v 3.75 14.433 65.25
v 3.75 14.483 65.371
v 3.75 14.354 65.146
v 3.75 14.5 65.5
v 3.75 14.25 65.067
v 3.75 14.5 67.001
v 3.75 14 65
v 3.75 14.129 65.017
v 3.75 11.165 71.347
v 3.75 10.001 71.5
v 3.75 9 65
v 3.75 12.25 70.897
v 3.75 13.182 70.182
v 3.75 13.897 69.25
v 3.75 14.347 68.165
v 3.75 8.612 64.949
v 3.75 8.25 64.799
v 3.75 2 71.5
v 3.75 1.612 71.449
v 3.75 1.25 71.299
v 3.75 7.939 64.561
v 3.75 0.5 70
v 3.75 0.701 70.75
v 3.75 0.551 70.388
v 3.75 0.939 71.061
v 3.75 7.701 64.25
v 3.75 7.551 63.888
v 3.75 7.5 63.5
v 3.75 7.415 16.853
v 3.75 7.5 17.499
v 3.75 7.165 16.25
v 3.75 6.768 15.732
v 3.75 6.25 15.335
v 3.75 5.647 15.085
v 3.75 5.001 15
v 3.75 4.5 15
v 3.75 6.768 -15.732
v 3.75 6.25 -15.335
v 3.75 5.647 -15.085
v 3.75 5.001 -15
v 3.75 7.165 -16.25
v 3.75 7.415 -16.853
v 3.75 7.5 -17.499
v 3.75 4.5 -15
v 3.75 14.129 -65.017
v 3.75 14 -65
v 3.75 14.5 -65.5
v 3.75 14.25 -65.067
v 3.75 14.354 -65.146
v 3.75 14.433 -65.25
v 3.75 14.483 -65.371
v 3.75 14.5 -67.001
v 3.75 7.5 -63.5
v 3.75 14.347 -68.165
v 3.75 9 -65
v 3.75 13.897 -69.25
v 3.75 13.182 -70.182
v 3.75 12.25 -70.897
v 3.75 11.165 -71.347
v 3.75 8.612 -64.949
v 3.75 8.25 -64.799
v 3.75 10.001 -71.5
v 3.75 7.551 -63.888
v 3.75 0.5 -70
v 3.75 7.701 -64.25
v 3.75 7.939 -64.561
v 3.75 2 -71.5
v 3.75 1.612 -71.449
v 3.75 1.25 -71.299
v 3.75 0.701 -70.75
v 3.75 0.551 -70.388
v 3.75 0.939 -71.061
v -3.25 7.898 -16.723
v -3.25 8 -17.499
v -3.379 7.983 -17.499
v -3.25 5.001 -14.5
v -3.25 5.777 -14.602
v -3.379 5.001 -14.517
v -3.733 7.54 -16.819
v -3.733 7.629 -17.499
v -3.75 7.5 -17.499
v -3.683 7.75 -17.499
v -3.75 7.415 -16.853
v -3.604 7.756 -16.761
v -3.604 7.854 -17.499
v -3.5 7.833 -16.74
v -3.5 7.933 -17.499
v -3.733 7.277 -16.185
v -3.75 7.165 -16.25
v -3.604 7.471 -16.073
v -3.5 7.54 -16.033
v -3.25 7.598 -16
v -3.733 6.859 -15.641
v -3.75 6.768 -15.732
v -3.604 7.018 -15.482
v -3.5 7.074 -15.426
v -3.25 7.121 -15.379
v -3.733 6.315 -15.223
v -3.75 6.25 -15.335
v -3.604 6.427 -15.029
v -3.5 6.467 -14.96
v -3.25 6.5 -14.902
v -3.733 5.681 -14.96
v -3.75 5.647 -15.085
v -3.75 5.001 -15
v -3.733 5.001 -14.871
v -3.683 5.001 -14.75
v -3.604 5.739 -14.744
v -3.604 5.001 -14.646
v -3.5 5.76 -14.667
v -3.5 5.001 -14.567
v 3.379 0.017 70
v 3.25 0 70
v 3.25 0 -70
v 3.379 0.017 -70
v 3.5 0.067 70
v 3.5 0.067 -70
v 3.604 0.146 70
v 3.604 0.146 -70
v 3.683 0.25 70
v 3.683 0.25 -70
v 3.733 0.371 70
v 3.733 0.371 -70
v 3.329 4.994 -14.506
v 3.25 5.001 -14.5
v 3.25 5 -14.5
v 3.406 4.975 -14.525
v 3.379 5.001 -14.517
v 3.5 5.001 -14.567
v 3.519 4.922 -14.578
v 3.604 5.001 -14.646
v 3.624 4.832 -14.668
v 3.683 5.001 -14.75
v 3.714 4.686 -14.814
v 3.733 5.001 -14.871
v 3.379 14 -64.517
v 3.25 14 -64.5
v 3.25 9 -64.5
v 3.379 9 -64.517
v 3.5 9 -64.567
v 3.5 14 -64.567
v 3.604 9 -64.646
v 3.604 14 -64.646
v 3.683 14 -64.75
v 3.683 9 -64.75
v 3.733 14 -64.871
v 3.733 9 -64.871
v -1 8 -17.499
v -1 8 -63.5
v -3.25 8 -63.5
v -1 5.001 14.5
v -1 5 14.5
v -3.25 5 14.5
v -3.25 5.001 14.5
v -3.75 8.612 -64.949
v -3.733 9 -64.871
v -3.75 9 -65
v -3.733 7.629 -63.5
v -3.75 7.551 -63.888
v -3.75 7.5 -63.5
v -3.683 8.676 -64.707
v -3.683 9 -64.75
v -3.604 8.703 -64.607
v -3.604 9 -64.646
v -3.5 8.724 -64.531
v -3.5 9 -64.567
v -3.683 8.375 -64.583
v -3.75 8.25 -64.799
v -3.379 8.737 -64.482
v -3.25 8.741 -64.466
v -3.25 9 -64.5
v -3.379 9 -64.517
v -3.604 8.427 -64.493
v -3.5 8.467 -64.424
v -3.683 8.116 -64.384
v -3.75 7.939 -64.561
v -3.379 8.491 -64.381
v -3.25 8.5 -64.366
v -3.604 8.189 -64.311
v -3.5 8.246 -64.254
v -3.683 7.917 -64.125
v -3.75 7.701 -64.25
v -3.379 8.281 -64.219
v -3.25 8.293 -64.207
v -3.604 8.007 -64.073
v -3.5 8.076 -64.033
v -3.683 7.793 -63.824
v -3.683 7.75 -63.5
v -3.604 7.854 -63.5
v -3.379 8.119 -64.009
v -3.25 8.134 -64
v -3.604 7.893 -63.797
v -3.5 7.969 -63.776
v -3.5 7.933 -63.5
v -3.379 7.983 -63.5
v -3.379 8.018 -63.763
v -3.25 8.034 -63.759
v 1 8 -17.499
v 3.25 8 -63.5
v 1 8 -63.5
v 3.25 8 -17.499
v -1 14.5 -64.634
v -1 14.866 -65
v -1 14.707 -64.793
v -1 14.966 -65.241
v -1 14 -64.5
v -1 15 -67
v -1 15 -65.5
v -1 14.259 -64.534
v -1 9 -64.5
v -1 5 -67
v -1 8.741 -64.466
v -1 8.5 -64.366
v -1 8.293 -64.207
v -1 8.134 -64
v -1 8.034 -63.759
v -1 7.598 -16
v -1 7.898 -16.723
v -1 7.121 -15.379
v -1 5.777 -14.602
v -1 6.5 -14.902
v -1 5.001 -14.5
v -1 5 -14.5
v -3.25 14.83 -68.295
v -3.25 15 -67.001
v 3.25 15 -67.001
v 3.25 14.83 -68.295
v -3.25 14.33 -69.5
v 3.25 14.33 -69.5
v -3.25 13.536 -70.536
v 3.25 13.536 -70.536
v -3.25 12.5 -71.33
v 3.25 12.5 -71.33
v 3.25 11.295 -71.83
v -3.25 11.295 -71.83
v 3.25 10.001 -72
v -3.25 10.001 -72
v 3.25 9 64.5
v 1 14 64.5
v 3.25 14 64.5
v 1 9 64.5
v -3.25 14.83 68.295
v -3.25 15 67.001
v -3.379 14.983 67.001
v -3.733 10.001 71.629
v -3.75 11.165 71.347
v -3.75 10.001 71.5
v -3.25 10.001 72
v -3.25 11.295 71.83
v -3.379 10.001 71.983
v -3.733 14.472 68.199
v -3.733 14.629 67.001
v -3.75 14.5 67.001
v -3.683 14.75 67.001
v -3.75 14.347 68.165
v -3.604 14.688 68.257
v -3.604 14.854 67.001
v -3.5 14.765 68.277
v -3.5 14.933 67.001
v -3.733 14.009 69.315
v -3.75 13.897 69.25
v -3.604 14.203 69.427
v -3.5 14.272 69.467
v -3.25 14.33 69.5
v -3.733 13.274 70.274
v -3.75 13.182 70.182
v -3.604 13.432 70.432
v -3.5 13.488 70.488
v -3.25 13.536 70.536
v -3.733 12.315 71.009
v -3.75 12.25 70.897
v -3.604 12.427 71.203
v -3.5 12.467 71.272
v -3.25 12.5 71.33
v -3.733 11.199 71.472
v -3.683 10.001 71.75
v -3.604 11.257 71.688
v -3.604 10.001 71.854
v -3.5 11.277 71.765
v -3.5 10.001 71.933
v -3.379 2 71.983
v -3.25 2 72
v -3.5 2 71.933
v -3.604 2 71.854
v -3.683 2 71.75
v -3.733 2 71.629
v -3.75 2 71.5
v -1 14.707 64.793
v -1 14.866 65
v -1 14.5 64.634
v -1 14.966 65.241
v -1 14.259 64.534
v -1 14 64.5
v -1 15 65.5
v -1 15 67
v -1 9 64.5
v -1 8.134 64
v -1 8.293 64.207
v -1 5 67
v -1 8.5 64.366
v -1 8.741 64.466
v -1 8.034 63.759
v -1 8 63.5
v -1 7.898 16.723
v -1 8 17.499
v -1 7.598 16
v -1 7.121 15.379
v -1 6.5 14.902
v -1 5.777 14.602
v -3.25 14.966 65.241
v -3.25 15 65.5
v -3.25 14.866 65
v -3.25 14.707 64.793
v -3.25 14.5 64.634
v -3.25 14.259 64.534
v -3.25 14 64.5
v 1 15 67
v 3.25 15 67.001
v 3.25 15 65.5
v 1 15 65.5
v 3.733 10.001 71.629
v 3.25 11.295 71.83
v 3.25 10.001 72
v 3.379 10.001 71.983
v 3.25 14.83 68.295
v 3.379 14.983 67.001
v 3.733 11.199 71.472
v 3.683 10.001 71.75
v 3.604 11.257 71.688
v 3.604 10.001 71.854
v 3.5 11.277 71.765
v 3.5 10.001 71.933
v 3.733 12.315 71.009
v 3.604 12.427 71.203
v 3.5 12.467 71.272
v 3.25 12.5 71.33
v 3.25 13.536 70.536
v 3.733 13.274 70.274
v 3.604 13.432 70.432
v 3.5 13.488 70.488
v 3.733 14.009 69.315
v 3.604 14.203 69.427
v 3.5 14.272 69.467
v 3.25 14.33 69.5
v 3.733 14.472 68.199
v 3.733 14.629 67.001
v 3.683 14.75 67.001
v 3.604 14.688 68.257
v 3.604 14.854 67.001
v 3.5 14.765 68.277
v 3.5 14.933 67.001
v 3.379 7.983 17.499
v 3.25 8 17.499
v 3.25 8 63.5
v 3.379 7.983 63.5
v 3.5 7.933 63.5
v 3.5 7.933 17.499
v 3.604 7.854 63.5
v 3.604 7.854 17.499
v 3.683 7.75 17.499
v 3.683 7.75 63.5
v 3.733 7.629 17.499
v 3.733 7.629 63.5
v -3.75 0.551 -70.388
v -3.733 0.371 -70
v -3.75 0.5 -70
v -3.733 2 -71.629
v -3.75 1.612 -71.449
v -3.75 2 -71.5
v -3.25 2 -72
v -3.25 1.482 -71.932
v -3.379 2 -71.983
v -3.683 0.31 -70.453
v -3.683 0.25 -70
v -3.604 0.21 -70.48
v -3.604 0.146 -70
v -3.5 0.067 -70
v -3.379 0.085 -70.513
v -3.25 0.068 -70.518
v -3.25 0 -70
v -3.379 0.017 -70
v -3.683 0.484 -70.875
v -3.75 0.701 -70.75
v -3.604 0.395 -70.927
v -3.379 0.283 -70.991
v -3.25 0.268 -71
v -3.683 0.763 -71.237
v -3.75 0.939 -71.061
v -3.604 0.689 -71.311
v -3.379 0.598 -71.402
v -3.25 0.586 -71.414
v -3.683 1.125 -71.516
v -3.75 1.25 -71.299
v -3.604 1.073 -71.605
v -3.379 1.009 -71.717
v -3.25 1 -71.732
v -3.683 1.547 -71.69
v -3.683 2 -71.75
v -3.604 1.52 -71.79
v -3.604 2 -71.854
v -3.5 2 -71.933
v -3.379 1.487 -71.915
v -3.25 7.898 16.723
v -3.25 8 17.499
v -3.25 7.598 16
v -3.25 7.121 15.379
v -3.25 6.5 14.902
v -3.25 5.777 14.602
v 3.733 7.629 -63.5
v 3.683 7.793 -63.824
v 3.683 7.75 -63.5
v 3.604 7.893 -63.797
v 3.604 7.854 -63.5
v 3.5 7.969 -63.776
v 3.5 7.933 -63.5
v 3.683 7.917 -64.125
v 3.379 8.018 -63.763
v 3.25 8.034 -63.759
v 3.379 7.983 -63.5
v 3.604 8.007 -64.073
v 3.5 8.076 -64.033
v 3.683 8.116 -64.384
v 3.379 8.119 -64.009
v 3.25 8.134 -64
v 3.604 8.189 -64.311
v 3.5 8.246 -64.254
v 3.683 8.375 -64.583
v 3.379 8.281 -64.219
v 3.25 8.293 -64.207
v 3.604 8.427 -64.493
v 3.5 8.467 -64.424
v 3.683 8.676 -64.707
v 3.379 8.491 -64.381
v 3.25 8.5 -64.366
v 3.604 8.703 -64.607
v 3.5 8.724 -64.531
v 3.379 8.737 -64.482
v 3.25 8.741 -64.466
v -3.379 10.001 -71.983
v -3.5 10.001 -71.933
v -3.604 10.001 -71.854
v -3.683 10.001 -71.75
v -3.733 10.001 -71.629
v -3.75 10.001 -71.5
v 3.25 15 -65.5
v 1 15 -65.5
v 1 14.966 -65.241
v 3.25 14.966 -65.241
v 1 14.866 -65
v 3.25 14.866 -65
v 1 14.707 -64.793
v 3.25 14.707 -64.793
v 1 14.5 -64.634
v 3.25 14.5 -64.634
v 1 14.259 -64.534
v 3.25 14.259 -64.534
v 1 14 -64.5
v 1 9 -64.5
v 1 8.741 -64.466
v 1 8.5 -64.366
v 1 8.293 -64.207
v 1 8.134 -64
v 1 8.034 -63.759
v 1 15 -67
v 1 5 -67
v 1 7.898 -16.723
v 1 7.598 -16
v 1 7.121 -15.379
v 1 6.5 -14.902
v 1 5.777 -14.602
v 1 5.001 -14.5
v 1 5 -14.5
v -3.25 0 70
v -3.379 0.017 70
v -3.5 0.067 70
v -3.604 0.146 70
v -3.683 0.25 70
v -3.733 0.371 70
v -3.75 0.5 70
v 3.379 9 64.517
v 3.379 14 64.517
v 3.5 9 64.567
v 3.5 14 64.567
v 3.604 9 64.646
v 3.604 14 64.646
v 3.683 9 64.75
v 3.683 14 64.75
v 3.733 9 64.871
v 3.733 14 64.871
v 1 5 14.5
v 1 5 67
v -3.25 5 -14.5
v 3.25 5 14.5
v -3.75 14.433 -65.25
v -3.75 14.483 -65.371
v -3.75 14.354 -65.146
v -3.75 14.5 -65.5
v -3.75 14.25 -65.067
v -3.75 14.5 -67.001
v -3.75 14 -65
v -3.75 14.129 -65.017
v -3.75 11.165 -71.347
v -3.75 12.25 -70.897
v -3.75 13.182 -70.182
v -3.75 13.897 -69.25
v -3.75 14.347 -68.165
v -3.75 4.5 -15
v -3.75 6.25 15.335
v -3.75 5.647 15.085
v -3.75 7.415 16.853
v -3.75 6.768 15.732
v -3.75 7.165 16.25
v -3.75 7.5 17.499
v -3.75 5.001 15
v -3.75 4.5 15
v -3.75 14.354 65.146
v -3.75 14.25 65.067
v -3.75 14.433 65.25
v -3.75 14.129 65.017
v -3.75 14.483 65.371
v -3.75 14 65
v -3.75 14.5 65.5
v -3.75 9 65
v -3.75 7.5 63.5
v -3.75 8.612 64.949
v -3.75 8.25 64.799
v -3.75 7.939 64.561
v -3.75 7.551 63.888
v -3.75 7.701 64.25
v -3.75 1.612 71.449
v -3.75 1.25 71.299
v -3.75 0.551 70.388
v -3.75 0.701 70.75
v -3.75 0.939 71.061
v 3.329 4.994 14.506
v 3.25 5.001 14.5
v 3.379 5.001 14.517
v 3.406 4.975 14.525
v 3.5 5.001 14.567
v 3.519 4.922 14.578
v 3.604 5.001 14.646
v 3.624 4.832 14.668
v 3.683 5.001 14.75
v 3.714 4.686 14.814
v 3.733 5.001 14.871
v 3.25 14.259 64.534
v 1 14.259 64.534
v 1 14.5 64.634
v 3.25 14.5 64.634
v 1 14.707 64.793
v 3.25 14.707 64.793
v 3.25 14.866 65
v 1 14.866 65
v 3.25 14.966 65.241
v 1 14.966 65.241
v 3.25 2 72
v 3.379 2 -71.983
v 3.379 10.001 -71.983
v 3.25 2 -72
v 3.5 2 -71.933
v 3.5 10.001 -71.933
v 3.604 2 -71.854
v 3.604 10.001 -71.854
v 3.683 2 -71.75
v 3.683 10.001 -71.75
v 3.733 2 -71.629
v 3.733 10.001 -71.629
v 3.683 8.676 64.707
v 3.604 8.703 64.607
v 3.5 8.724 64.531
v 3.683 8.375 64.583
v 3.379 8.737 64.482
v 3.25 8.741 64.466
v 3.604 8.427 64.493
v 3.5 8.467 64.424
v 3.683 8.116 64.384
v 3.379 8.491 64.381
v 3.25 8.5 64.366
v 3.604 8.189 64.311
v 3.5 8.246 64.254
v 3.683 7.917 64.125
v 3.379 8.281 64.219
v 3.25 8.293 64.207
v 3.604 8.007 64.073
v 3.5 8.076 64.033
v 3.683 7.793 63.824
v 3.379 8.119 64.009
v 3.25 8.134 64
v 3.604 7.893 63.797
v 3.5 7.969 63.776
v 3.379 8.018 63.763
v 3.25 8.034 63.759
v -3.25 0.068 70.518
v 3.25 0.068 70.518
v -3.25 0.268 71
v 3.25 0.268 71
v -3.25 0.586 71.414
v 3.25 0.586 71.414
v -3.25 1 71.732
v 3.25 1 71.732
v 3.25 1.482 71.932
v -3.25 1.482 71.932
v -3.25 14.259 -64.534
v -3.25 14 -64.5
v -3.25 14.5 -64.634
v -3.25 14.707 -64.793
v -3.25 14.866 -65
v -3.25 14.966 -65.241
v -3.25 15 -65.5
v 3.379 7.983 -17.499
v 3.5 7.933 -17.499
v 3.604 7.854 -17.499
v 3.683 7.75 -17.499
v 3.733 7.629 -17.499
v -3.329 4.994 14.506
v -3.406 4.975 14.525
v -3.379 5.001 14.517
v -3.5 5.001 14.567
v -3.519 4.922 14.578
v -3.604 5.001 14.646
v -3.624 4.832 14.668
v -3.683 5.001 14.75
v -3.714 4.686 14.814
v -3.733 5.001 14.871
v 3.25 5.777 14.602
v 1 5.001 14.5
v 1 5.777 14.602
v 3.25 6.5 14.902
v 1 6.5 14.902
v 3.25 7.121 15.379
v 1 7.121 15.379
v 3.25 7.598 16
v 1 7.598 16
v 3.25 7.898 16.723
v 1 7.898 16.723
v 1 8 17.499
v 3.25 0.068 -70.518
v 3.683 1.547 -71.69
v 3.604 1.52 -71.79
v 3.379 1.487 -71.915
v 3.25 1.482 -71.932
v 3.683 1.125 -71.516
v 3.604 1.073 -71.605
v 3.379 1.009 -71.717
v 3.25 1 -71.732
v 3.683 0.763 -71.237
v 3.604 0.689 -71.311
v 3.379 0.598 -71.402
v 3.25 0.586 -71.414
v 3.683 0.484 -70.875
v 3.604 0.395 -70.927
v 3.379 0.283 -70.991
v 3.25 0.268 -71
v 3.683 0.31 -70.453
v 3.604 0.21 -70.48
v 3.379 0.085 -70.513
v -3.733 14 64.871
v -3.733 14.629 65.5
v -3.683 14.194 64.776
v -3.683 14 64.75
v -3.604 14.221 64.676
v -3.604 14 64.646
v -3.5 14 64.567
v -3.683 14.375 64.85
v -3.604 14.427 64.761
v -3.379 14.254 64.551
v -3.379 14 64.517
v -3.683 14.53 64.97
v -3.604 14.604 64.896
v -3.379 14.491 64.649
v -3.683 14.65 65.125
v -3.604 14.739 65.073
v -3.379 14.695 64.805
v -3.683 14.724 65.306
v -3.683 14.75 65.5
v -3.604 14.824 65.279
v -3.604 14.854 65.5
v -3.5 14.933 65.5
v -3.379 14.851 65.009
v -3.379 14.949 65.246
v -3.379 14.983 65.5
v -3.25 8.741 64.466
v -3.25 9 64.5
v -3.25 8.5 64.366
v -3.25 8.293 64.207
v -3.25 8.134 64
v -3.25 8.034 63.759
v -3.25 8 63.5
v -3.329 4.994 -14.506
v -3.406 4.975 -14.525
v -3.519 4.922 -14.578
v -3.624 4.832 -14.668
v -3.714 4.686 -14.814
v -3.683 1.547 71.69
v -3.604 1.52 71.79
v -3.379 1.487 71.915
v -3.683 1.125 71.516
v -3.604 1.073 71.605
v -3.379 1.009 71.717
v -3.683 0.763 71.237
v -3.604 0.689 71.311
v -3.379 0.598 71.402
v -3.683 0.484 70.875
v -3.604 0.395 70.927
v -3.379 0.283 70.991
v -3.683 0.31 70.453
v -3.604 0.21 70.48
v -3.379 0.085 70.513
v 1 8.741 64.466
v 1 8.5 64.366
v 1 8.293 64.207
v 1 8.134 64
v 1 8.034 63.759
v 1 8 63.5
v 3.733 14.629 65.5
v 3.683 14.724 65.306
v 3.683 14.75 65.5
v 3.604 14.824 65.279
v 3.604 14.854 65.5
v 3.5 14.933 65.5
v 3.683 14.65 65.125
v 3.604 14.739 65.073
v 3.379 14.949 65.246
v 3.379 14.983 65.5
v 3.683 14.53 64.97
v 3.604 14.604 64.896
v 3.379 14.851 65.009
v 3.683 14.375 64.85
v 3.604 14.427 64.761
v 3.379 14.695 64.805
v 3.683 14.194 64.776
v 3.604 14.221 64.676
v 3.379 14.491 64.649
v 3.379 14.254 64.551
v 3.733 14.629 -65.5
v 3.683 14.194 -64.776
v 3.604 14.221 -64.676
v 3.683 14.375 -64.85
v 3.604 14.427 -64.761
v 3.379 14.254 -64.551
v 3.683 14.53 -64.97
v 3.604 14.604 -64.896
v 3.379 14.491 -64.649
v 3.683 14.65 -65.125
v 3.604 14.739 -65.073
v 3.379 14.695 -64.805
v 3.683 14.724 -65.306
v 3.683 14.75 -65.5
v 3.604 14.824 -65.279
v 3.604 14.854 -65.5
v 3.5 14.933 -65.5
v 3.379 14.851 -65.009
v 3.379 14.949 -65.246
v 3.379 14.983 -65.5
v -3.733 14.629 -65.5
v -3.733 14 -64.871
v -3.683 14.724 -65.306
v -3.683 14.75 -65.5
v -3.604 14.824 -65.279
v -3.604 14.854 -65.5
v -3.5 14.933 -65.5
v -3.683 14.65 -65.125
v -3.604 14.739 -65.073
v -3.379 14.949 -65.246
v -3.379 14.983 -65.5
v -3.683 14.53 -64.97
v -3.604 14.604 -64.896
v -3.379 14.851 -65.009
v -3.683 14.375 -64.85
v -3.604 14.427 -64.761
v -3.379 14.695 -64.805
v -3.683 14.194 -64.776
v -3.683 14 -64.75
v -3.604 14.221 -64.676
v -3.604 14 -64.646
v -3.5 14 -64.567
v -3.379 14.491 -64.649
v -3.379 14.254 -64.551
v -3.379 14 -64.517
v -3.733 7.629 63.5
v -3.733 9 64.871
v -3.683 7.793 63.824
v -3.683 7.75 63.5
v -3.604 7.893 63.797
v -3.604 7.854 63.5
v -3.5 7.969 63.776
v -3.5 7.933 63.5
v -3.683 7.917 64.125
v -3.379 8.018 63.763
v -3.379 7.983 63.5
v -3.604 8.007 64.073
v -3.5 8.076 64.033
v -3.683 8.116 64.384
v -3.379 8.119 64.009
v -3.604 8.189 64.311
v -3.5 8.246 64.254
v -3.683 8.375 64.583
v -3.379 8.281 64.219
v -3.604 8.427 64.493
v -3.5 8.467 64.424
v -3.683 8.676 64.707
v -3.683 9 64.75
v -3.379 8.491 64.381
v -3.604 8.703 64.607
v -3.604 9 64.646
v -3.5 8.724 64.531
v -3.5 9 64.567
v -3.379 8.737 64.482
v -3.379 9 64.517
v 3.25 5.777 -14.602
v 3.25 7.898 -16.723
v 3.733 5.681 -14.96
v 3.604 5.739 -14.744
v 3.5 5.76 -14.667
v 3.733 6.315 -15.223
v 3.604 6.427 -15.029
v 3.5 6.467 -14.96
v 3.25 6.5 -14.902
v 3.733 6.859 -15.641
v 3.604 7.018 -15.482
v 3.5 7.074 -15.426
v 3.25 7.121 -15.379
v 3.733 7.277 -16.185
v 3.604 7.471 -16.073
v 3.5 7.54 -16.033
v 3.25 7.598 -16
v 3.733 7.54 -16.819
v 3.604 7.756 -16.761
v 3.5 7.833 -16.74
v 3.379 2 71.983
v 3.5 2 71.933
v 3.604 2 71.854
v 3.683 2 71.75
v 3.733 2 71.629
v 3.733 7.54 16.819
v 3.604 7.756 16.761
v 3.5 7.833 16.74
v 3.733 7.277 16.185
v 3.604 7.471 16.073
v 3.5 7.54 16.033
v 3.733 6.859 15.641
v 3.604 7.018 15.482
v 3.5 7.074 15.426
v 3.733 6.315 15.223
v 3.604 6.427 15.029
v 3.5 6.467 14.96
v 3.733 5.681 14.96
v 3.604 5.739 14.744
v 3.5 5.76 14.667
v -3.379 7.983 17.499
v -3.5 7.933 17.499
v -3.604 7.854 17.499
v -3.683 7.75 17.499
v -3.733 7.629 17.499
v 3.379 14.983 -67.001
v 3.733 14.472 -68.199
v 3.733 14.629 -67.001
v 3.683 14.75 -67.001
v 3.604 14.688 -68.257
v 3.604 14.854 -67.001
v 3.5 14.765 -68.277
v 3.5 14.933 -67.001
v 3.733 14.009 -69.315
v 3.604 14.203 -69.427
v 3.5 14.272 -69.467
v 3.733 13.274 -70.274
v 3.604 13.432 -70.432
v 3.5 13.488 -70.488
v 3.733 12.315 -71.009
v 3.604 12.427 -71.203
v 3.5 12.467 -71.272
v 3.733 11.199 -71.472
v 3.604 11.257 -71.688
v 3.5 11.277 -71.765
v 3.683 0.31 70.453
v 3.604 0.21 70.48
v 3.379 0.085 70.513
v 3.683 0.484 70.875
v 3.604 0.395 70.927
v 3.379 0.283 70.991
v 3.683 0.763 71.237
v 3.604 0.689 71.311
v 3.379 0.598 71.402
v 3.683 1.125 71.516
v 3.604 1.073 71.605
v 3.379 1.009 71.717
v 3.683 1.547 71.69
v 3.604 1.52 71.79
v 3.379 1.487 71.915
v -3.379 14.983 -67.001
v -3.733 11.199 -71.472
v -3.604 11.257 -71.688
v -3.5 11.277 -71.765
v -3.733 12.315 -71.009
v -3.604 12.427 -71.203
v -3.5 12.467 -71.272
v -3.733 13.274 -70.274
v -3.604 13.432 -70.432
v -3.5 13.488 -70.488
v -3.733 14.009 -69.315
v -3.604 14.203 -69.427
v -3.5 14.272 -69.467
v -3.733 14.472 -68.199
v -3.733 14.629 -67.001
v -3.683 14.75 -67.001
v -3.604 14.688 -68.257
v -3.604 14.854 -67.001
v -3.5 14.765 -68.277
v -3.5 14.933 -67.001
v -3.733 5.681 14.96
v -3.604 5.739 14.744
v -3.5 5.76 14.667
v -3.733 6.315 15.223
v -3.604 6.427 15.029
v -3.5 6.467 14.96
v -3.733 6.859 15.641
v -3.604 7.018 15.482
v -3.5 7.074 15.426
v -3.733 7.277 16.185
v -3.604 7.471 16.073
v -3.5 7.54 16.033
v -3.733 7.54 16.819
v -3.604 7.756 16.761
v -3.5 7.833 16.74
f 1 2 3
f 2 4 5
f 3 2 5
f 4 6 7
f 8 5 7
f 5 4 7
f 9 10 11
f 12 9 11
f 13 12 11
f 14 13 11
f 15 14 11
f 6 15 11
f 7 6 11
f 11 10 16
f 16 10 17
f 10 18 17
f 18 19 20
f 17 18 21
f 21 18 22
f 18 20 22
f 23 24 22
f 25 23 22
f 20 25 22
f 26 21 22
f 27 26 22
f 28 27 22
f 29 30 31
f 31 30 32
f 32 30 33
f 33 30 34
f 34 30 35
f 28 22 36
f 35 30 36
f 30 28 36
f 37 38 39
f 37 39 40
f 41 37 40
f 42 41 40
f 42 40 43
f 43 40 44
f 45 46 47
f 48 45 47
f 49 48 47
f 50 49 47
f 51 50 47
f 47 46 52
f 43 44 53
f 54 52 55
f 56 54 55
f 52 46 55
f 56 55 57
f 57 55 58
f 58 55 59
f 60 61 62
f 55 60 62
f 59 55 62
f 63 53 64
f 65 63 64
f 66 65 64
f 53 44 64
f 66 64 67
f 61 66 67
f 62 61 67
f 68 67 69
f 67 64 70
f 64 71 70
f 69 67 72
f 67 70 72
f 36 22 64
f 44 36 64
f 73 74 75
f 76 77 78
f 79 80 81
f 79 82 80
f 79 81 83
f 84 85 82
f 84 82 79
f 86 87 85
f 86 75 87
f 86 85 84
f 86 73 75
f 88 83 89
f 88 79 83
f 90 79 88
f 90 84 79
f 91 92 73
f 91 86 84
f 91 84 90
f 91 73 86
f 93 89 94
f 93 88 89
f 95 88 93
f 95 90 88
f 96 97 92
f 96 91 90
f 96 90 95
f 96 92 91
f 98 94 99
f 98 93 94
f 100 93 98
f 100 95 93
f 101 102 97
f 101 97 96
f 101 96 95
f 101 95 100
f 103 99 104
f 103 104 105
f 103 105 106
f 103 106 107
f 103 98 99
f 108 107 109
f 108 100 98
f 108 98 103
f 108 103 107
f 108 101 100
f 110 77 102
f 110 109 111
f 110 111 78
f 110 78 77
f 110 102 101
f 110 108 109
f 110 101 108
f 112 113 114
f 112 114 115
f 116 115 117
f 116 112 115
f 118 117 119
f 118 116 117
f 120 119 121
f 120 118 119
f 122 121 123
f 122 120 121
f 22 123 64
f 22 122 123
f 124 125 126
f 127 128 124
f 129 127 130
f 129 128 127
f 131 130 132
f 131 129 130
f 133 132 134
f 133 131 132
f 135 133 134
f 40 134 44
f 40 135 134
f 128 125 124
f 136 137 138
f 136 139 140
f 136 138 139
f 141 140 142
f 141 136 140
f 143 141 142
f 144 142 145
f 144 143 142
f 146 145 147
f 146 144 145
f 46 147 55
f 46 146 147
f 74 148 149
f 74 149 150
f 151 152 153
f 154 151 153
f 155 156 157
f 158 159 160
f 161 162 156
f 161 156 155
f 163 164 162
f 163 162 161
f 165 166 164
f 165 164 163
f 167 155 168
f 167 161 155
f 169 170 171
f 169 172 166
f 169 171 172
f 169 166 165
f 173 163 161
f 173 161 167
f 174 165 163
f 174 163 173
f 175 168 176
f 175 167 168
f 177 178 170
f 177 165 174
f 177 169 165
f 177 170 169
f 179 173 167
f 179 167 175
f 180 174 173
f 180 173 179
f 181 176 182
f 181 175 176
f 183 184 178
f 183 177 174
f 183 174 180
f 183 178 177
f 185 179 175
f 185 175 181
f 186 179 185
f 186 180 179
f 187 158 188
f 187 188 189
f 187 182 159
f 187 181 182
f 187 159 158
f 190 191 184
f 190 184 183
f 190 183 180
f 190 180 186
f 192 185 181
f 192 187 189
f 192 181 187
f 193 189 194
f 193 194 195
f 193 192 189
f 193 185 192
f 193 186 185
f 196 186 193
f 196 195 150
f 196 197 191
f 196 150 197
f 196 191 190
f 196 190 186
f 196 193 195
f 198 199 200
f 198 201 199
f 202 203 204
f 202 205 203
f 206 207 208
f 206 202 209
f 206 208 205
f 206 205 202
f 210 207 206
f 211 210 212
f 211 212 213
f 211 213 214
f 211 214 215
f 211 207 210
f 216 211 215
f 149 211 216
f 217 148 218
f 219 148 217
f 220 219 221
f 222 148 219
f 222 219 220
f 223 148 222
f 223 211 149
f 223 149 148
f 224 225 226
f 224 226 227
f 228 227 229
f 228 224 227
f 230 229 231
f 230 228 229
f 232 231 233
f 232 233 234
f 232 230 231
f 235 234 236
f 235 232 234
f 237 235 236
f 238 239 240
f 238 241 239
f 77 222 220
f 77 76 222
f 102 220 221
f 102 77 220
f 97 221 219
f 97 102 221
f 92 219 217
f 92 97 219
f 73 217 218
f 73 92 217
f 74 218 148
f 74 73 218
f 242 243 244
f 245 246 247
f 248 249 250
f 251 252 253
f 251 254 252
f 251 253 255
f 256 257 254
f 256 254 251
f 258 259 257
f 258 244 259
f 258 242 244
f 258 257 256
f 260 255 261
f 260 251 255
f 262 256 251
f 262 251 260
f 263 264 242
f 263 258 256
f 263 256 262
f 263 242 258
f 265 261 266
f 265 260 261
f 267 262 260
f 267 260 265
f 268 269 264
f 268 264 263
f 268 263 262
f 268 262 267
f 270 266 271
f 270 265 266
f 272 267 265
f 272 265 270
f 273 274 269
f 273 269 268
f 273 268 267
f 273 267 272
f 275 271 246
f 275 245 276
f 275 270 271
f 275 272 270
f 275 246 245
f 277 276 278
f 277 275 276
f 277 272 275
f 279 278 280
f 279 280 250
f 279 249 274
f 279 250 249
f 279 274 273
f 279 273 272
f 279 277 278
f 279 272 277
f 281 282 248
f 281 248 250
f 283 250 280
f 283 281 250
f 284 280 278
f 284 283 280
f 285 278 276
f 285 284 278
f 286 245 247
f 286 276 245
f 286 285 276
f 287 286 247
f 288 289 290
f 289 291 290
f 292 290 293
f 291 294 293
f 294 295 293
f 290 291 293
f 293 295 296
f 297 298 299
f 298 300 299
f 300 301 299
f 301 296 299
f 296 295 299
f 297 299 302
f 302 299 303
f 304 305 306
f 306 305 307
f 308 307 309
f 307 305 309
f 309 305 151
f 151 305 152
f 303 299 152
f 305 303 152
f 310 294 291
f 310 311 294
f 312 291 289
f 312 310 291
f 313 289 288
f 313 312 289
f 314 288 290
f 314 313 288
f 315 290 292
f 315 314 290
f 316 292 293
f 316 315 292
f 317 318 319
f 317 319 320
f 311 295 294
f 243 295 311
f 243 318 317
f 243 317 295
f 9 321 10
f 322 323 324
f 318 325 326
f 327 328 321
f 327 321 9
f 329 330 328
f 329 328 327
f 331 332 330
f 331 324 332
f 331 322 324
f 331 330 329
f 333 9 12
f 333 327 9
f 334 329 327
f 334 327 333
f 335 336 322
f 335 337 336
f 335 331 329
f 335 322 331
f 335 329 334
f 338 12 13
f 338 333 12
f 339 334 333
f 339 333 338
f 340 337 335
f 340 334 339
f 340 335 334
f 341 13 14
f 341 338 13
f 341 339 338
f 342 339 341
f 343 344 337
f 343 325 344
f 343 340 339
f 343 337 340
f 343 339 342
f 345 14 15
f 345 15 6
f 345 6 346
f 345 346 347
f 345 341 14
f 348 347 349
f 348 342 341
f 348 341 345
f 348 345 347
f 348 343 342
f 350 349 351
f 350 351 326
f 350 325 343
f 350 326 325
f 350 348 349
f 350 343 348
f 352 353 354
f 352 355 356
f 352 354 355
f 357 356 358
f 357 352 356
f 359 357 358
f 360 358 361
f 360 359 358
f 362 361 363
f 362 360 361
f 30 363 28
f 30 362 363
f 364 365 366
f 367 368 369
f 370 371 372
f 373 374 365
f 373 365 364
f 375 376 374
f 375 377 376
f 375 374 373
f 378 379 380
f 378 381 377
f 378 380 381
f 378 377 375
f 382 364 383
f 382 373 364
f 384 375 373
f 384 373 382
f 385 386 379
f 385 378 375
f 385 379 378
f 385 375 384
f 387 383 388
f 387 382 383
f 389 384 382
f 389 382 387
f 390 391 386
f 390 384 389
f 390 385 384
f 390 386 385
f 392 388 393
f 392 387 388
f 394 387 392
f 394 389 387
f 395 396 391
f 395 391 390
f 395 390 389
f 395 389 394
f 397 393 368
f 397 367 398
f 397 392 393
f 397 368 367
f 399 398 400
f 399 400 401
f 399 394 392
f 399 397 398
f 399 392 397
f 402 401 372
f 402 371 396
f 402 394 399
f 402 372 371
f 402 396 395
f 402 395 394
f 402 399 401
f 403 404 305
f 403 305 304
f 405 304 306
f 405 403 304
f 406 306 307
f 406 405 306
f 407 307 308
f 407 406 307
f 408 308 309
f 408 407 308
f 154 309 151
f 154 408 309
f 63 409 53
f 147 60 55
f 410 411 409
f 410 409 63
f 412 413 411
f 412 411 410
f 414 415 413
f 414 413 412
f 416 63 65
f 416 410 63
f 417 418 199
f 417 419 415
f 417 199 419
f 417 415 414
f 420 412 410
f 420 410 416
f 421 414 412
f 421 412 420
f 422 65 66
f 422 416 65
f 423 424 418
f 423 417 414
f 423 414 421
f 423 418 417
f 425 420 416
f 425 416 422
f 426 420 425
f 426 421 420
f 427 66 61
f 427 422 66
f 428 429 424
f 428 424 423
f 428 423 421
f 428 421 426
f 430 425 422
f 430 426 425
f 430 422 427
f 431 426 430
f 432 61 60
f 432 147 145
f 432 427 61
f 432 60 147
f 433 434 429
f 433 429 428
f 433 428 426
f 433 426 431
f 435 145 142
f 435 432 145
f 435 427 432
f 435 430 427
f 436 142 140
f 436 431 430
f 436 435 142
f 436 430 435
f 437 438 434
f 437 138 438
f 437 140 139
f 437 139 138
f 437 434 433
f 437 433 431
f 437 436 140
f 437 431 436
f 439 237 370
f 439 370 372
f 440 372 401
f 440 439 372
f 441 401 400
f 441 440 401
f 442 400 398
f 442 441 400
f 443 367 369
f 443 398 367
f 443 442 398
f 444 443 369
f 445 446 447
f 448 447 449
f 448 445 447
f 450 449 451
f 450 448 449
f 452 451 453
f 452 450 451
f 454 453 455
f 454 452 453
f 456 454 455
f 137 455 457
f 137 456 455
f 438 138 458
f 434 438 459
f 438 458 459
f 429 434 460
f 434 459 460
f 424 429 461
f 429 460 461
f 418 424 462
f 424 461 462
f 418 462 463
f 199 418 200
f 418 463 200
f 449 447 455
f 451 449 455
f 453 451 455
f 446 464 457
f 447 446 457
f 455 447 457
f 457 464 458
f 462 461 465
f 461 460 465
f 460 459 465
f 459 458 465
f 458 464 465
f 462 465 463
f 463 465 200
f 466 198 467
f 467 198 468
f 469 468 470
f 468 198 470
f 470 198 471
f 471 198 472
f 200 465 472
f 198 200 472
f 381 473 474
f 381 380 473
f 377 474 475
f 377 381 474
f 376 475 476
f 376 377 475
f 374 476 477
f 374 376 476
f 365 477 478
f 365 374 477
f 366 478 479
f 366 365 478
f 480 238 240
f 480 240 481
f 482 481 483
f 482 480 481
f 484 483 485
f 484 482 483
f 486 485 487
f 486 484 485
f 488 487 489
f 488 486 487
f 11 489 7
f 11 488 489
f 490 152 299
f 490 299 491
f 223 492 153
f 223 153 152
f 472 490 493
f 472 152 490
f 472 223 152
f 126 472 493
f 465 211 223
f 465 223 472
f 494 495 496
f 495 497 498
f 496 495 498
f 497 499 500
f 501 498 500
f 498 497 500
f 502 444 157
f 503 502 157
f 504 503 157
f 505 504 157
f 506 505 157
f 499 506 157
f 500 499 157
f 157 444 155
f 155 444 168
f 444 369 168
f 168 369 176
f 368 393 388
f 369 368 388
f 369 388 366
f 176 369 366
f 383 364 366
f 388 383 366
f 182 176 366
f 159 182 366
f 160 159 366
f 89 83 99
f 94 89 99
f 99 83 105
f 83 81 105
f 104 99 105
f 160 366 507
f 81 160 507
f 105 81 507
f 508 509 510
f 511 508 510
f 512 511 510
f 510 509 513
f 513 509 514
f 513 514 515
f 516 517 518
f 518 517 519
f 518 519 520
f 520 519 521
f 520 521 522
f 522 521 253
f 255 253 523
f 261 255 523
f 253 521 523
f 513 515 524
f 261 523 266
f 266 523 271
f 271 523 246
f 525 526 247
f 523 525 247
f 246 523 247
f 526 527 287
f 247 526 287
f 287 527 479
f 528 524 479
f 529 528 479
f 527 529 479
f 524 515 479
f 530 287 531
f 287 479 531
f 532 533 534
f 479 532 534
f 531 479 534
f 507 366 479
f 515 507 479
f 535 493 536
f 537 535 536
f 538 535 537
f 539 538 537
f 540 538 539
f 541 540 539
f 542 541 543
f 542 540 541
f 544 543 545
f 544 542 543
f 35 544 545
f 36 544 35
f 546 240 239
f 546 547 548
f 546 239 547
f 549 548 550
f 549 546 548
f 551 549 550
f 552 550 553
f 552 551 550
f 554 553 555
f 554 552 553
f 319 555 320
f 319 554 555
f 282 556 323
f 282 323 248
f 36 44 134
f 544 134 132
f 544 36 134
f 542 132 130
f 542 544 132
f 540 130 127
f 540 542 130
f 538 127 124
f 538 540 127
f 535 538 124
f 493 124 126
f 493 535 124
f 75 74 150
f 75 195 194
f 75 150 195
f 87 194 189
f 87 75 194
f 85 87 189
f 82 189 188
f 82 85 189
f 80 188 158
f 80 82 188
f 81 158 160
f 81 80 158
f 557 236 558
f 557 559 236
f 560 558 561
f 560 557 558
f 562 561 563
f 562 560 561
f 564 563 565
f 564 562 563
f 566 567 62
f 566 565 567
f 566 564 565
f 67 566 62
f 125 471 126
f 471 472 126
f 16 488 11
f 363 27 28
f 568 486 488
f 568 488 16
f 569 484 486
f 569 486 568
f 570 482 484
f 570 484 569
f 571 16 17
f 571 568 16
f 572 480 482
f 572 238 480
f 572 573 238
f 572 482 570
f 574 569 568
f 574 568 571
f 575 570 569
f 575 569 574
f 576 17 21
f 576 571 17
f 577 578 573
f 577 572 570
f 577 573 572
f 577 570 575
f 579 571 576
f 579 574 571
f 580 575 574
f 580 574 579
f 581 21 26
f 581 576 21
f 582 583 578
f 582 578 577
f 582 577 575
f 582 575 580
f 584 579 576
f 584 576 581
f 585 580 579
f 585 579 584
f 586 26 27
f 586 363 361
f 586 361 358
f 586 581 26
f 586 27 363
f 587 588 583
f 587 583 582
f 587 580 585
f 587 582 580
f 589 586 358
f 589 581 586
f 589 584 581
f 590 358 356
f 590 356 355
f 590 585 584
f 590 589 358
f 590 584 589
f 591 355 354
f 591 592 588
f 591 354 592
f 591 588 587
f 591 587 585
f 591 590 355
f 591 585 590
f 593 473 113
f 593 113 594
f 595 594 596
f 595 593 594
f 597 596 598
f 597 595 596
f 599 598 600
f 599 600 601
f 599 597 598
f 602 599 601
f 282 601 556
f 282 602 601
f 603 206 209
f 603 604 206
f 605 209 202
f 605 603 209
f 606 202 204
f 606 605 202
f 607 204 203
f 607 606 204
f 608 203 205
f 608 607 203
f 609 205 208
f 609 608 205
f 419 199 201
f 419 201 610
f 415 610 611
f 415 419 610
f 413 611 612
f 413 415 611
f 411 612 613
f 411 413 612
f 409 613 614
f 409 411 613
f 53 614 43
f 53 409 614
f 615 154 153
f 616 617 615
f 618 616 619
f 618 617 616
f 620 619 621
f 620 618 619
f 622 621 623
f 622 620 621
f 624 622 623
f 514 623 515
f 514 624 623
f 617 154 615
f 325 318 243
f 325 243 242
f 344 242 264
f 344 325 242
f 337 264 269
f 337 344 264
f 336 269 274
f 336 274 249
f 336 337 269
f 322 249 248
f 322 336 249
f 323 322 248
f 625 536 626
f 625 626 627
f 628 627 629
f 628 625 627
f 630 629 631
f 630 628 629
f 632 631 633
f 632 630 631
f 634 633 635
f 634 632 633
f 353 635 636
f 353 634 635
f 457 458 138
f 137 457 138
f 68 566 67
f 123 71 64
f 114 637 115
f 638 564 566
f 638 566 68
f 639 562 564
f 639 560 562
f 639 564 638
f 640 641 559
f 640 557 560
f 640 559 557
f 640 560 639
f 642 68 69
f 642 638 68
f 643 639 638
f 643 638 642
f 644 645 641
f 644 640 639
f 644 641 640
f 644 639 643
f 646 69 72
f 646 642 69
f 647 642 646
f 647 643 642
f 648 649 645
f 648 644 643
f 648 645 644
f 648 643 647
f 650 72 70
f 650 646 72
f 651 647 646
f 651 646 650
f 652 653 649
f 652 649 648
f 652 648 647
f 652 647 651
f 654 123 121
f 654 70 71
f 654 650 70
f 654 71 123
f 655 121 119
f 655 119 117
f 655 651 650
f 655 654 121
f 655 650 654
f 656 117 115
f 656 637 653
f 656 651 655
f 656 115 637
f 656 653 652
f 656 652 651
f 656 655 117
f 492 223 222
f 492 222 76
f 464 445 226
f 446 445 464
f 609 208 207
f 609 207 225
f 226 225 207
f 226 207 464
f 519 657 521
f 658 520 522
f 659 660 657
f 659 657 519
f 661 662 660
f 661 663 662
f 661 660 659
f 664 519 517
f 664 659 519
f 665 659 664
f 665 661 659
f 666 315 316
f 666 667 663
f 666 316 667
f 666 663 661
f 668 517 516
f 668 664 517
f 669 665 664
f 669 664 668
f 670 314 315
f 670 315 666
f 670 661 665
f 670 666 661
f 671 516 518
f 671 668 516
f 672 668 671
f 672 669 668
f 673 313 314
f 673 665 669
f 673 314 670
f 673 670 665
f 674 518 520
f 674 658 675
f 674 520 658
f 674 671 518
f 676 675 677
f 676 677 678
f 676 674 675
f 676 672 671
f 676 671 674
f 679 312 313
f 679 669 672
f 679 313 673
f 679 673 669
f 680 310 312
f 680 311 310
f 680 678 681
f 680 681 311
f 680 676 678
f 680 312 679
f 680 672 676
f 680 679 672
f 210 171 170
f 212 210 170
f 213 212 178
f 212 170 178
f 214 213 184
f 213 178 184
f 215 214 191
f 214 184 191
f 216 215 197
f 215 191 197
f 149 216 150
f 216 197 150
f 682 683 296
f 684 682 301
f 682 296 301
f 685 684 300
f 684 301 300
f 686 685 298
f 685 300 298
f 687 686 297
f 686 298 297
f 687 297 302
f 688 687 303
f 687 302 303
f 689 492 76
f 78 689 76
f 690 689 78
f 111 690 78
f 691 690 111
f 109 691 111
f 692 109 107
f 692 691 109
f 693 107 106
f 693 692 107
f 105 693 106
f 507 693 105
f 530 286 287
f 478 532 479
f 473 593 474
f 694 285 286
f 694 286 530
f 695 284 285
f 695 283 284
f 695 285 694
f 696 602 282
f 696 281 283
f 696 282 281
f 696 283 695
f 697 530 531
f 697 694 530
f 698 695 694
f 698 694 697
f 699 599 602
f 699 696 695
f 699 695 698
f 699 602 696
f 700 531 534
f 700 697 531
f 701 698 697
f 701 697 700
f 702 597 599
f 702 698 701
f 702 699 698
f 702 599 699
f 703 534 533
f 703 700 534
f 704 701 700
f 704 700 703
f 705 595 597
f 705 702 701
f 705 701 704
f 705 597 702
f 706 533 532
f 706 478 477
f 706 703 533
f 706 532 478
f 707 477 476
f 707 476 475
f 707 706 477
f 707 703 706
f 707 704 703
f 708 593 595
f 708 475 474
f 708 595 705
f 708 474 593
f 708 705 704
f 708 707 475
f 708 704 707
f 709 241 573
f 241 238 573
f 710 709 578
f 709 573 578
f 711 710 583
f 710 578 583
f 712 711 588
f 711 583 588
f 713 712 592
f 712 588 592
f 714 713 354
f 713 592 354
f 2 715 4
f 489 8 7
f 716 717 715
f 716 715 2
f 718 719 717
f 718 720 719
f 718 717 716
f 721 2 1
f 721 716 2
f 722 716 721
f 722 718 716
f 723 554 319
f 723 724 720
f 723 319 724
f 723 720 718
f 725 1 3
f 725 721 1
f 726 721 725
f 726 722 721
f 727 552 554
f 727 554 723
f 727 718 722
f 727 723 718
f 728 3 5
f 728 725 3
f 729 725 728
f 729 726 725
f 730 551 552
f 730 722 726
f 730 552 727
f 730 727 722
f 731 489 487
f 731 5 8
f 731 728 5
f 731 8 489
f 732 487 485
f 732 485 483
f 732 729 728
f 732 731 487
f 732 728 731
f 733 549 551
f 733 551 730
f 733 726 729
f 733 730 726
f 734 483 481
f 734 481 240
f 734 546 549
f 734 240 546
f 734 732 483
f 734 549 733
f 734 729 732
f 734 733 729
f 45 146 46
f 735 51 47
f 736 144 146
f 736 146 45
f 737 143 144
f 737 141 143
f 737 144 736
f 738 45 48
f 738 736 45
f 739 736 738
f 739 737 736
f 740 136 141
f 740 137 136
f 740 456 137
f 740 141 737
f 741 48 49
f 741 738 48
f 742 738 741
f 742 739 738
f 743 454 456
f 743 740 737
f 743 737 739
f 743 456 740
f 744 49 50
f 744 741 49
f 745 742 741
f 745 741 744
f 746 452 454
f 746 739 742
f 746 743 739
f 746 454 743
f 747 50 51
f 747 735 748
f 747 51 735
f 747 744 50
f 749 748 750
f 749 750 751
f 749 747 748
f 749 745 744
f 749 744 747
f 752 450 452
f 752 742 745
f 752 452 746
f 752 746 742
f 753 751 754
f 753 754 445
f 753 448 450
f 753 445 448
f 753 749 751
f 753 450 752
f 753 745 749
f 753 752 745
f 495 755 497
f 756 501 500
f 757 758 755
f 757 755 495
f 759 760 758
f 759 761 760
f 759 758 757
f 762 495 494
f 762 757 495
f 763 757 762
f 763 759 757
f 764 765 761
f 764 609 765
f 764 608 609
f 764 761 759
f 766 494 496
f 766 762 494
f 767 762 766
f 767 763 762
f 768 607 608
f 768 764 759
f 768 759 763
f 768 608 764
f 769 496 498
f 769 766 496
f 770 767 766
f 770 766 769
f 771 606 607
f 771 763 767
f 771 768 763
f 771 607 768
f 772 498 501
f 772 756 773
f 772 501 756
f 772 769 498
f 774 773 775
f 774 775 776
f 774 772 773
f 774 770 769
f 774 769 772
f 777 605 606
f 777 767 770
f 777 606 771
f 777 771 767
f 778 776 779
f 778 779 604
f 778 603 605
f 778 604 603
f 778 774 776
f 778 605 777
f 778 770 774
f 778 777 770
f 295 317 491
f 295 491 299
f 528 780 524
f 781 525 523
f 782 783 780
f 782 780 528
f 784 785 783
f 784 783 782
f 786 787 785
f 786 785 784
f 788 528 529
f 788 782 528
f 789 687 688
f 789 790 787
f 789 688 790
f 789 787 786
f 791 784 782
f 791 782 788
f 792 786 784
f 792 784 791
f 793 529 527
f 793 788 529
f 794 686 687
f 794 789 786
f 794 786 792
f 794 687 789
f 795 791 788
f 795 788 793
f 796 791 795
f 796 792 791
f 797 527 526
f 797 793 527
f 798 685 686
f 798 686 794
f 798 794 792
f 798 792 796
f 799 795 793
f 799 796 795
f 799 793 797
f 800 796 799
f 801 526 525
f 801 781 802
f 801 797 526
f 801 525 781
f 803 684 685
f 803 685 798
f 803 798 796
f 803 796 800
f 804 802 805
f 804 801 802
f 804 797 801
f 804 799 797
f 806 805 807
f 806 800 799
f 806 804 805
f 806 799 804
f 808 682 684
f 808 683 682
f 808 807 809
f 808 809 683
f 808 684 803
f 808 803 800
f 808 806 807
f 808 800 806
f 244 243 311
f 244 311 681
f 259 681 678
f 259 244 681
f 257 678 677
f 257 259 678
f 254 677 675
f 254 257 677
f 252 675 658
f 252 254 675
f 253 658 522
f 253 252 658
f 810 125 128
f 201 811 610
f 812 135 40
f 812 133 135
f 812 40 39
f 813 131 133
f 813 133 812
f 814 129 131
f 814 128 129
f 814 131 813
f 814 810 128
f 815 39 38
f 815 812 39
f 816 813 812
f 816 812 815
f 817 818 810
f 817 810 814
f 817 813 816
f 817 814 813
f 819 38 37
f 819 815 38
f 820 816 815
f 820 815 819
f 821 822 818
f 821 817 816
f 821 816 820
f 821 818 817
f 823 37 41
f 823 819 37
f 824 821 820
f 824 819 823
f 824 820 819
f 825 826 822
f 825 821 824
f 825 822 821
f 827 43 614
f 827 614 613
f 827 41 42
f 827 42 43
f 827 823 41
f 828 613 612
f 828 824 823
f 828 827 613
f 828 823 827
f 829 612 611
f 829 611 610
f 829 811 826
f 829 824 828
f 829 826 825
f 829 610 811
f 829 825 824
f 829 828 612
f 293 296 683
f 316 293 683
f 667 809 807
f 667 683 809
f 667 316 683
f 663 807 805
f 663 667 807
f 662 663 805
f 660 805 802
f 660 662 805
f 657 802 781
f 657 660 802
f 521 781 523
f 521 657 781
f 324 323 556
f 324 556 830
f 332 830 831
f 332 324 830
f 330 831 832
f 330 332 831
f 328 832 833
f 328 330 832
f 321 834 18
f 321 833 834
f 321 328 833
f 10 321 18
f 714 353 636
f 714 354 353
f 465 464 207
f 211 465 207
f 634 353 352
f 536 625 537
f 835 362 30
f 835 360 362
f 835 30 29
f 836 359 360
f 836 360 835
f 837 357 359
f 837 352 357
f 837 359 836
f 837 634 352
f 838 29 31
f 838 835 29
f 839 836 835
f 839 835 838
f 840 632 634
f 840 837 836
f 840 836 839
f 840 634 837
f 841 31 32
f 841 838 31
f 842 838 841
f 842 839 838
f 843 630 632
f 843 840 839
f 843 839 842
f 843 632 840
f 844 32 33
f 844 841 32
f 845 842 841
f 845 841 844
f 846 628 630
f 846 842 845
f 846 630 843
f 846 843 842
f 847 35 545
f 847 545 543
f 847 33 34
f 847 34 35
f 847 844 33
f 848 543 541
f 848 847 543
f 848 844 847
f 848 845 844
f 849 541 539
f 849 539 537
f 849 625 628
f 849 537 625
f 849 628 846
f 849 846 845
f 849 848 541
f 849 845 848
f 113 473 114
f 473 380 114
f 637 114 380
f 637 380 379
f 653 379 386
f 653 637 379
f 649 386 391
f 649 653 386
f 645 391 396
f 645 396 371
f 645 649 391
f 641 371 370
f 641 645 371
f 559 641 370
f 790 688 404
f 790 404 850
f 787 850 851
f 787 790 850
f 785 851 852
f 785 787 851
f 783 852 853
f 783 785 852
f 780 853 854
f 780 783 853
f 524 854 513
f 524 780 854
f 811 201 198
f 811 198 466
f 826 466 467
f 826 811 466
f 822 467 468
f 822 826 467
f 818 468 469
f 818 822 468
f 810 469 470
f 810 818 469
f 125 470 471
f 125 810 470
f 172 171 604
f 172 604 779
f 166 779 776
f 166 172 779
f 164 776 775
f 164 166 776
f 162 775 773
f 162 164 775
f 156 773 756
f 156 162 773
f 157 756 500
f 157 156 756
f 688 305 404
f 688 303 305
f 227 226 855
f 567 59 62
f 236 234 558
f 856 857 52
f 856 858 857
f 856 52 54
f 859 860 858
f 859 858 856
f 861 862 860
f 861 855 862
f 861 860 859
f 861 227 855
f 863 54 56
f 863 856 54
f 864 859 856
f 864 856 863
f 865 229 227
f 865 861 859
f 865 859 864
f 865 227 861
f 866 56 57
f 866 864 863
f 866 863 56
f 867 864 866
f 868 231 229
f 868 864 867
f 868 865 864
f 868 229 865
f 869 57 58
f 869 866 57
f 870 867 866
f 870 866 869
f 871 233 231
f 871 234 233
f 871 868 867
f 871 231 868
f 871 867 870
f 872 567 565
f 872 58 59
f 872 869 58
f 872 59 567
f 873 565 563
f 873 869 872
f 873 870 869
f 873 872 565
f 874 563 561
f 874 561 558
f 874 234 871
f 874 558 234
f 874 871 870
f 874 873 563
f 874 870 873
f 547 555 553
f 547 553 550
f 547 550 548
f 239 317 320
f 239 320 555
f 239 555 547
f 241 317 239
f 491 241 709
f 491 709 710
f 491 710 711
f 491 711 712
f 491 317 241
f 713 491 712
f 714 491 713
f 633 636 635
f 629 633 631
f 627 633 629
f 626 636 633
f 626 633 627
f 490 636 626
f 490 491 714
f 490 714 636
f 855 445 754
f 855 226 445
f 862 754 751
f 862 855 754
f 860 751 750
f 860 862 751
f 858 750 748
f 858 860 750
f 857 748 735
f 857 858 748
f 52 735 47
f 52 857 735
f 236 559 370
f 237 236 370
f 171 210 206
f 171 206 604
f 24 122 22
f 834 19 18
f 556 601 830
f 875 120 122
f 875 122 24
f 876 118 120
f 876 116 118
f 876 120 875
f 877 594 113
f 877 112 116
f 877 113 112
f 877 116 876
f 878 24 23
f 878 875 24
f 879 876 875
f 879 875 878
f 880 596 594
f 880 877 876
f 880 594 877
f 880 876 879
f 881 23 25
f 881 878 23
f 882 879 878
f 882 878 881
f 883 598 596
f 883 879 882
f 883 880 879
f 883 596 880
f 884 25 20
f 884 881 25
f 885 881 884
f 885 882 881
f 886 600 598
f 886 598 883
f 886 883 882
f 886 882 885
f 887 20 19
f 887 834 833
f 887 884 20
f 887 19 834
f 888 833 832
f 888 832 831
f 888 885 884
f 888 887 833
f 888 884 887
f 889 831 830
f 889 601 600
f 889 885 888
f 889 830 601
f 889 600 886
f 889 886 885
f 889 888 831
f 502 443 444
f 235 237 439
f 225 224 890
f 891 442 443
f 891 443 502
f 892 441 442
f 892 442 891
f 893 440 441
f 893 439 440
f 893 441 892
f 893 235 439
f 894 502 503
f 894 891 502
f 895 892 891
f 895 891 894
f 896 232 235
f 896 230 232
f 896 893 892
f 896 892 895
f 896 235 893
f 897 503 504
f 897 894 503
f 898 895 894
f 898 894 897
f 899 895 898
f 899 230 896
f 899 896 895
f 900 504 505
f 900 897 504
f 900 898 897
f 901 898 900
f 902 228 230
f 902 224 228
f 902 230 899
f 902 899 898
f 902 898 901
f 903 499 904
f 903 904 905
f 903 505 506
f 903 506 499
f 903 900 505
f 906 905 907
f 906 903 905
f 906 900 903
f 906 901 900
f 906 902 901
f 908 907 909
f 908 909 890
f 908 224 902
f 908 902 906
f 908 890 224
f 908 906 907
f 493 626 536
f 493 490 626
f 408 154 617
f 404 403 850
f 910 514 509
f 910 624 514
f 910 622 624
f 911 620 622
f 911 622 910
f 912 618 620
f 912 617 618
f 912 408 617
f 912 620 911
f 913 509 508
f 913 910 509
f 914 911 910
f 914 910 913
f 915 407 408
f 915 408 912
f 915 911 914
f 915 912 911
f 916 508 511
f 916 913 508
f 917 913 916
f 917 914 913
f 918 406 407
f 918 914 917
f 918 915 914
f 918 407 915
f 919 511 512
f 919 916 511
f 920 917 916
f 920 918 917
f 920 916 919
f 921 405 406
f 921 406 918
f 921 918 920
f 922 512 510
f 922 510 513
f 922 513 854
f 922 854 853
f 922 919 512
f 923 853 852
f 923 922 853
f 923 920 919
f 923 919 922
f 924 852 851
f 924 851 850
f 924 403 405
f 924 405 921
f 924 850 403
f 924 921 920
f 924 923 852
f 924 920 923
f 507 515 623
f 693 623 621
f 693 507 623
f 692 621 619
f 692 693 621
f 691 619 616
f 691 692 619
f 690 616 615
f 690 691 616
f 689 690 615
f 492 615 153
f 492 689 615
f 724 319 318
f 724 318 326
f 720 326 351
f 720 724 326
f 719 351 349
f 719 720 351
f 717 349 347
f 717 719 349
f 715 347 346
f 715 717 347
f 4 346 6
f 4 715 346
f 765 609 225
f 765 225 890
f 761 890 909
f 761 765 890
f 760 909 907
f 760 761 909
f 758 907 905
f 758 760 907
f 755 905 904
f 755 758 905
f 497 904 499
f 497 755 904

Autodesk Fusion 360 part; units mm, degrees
sketch "Sketch1" plane through (0, 0, 0) normal (0, 1, 0) x (1, 0, 0)
  line L0 (3.75, -72) -> (-3.75, -72)
  line L1 (-3.75, -72) -> (-3.75, 72)
  line L2 (-3.75, 72) -> (3.75, 72)
  line L3 (3.75, 72) -> (3.75, -72)
  line L4 (3.75, -72) -> (-3.75, 72) construction
  line L5 (-3.75, -72) -> (3.75, 72) construction
  dimension "d1" = 7.5
  dimension "d2" = 144
extrude "Extrude1" add sketch "Sketch1" along normal blind 5
sketch "Sketch2" plane through (0, 5, 0) normal (0, 1, 0) x (-1, 0, 0)
  line L0 (-3.75, -72) -> (3.75, -72)
  line L1 (3.75, -72) -> (3.75, 72)
  line L2 (3.75, 72) -> (-3.75, 72)
  line L3 (-3.75, 72) -> (-3.75, -72)
  line L4 (3.75, 72) -> (-3.75, 72)
  line L5 (-3.75, 72) -> (-3.75, 67)
  line L6 (-3.75, 67) -> (3.75, 67)
  line L7 (3.75, 67) -> (3.75, 72)
  dimension "d5" = 5
extrude "Extrude2" add sketch "Sketch2" along normal blind 10 contours L1 L2 L3 L4 L5 L6 L7
sketch "Sketch3" plane through (0, 5, 0) normal (0, 1, 0) x (-1, 0, 0)
  line L0 (3.75, 67) -> (-3.75, 67)
  line L1 (-3.75, 67) -> (-3.75, -72)
  line L2 (-3.75, -72) -> (3.75, -72)
  line L3 (3.75, -72) -> (3.75, 67)
  line L4 (3.75, -72) -> (-3.75, -72)
  line L5 (-3.75, -72) -> (-3.75, -67)
  line L6 (-3.75, -67) -> (3.75, -67)
  line L7 (3.75, -67) -> (3.75, -72)
  dimension "d8" = 5
extrude "Extrude3" add sketch "Sketch3" along normal blind 10 contours L1 L2 L3 L4 L5 L6 L7
fillet "Fillet1" radius 5 1 edges at (0, 15, 72)
fillet "Fillet2" radius 5 1 edges at (0, 15, -72)
sketch "Sketch6" plane through (0, 5, 0) normal (0, 1, 0) x (-1, 0, 0)
  line L0 (-3.75, -67) -> (3.75, -67)
  line L1 (3.75, -67) -> (3.75, 67)
  line L2 (3.75, 67) -> (-3.75, 67)
  line L3 (-3.75, 67) -> (-3.75, -67)
  line L4 (3.75, -67) -> (1, -67)
  line L5 (1, -67) -> (1, -64.5)
  line L6 (1, -64.5) -> (3.75, -64.5)
  line L7 (3.75, -64.5) -> (3.75, -67)
  line L8 (-3.75, -67) -> (-1, -67)
  line L9 (-1, -67) -> (-1, -64.5)
  line L10 (-1, -64.5) -> (-3.75, -64.5)
  line L11 (-3.75, -64.5) -> (-3.75, -67)
  dimension "d18" = 2.75
  dimension "d19" = 2.5
  dimension "d20" = 2.75
  dimension "d21" = 2.5
extrude "Extrude5" add sketch "Sketch6" along normal blind 10 contours L0 L3 L8 L9 L10 L11 | L0 L1 L4 L5 L6 L7
sketch "Sketch7" plane through (0, 5, 0) normal (0, 1, 0) x (-1, 0, 0)
  line L0 (1, -67) -> (1, -64.5)
  line L1 (1, -64.5) -> (3.75, -64.5)
  line L2 (3.75, -64.5) -> (3.75, 67)
  line L3 (3.75, 67) -> (-3.75, 67)
  line L4 (-3.75, 67) -> (-3.75, -64.5)
  line L5 (-3.75, -64.5) -> (-1, -64.5)
  line L6 (-1, -64.5) -> (-1, -67)
  line L7 (-1, -67) -> (1, -67)
  line L8 (-3.75, 67) -> (-1, 67)
  line L9 (-1, 67) -> (-1, 64.5)
  line L10 (-1, 64.5) -> (-3.75, 64.5)
  line L11 (-3.75, 64.5) -> (-3.75, 67)
  dimension "d24" = 2.75
  dimension "d25" = 2.5
sketch "Sketch8" plane through (0, 5, 0) normal (0, 1, 0) x (-1, 0, 0)
  line L0 (3.75, 67) -> (1, 67)
  line L1 (1, 67) -> (1, 64.5)
  line L2 (1, 64.5) -> (3.75, 64.5)
  line L3 (3.75, 64.5) -> (3.75, 67)
  point P0 (3.75, 67)
  dimension "d26" = 2.75
  dimension "d27" = 2.5
extrude "Extrude6" add sketch "Sketch8" sketch "Sketch7" along normal blind 10 of sketch 2 contours L3 L4 L8 L9 L10 L11
sketch "Sketch9" plane through (0, 5, 0) normal (0, 1, 0) x (-1, 0, 0)
  line L0 (-1, 67) -> (-1, 64.5)
  line L1 (-1, 64.5) -> (-3.75, 64.5)
  line L2 (-3.75, 64.5) -> (-3.75, -64.5)
  line L3 (-3.75, -64.5) -> (-1, -64.5)
  line L4 (-1, -64.5) -> (-1, -67)
  line L5 (-1, -67) -> (1, -67)
  line L6 (1, -67) -> (1, -64.5)
  line L7 (1, -64.5) -> (3.75, -64.5)
  line L8 (3.75, -64.5) -> (3.75, 64.5)
  line L9 (3.75, 64.5) -> (1, 64.5)
  line L10 (1, 64.5) -> (1, 67)
  line L11 (1, 67) -> (-1, 67)
  line L12 (-3.75, 64.5) -> (-1, 64.5)
  line L13 (-1, 64.5) -> (-1, 14.5)
  line L14 (-1, 14.5) -> (-3.75, 14.5)
  line L15 (-3.75, 14.5) -> (-3.75, 64.5)
  line L16 (3.75, 64.5) -> (1, 64.5)
  line L17 (1, 64.5) -> (1, 14.5)
  line L18 (1, 14.5) -> (3.75, 14.5)
  line L19 (3.75, 14.5) -> (3.75, 64.5)
  line L20 (3.75, -64.5) -> (1, -64.5)
  line L21 (1, -64.5) -> (1, -14.5)
  line L22 (1, -14.5) -> (3.75, -14.5)
  line L23 (3.75, -14.5) -> (3.75, -64.5)
  line L24 (-3.75, -64.5) -> (-1, -64.5)
  line L25 (-1, -64.5) -> (-1, -14.5)
  line L26 (-1, -14.5) -> (-3.75, -14.5)
  line L27 (-3.75, -14.5) -> (-3.75, -64.5)
  dimension "d30" = 2.75
  dimension "d31" = 50
  dimension "d32" = 2.75
  dimension "d33" = 50
  dimension "d34" = 2.75
  dimension "d35" = 50
  dimension "d36" = 2.75
  dimension "d37" = 50
extrude "Extrude7" add sketch "Sketch9" along normal blind 3 contours L1 L2 L12 L13 L14 L15 | L8 L9 L16 L17 L18 L19 | L2 L3 L24 L25 L26 L27 | L7 L8 L20 L21 L22 L23
fillet "Fillet3" radius 3 4 edges at (2.375, 8, -14.5) (-2.375, 8, -14.5) (-2.375, 8, 14.5) (2.375, 8, 14.5)
fillet "Fillet4" radius 1 4 edges at (-2.375, 15, 64.5) (2.375, 15, 64.5) (-2.375, 15, -64.5) (2.375, 15, -64.5)
fillet "Fillet5" radius 1 4 edges at (-2.375, 8, -64.5) (2.375, 8, -64.5) (2.375, 8, 64.5) (-2.375, 8, 64.5)
fillet "Fillet6" radius 2 1 edges at (0, 0, -72)
fillet "Fillet7" radius 2 1 edges at (0, 0, 72)
fillet "Fillet8" radius 0.5 20 edges at (-3.75, 7.1213, 15.3787) (-3.75, 8, 40.5) (-3.75, 8.2929, 64.2071) (-3.75, 11.5, 64.5) (-3.75, 14.7071, 64.7929) (-3.75, 15, 66.25) (-3.75, 13.5355, 70.5355) (-3.75, 6, 72) (-3.75, 0.5858, 71.4142) (-3.75, 0, 0) (-3.75, 0.5858, -71.4142) (-3.75, 6, -72) (-3.75, 13.5355, -70.5355) (-3.75, 15, -66.25) (-3.75, 14.7071, -64.7929) (-3.75, 11.5, -64.5) (-3.75, 8.2929, -64.2071) (-3.75, 8, -40.5) (-3.75, 7.1213, -15.3787) (-3.75, 5, 0)
fillet "Fillet9" radius 0.5 20 edges at (3.75, 7.1213, -15.3787) (3.75, 8, -40.5) (3.75, 8.2929, -64.2071) (3.75, 11.5, -64.5) (3.75, 14.7071, -64.7929) (3.75, 15, -66.25) (3.75, 13.5355, -70.5355) (3.75, 6, -72) (3.75, 0.5858, -71.4142) (3.75, 0, 0) (3.75, 0.5858, 71.4142) (3.75, 6, 72) (3.75, 13.5355, 70.5355) (3.75, 15, 66.25) (3.75, 14.7071, 64.7929) (3.75, 11.5, 64.5) (3.75, 8.2929, 64.2071) (3.75, 8, 40.5) (3.75, 7.1213, 15.3787) (3.75, 5, 0)
